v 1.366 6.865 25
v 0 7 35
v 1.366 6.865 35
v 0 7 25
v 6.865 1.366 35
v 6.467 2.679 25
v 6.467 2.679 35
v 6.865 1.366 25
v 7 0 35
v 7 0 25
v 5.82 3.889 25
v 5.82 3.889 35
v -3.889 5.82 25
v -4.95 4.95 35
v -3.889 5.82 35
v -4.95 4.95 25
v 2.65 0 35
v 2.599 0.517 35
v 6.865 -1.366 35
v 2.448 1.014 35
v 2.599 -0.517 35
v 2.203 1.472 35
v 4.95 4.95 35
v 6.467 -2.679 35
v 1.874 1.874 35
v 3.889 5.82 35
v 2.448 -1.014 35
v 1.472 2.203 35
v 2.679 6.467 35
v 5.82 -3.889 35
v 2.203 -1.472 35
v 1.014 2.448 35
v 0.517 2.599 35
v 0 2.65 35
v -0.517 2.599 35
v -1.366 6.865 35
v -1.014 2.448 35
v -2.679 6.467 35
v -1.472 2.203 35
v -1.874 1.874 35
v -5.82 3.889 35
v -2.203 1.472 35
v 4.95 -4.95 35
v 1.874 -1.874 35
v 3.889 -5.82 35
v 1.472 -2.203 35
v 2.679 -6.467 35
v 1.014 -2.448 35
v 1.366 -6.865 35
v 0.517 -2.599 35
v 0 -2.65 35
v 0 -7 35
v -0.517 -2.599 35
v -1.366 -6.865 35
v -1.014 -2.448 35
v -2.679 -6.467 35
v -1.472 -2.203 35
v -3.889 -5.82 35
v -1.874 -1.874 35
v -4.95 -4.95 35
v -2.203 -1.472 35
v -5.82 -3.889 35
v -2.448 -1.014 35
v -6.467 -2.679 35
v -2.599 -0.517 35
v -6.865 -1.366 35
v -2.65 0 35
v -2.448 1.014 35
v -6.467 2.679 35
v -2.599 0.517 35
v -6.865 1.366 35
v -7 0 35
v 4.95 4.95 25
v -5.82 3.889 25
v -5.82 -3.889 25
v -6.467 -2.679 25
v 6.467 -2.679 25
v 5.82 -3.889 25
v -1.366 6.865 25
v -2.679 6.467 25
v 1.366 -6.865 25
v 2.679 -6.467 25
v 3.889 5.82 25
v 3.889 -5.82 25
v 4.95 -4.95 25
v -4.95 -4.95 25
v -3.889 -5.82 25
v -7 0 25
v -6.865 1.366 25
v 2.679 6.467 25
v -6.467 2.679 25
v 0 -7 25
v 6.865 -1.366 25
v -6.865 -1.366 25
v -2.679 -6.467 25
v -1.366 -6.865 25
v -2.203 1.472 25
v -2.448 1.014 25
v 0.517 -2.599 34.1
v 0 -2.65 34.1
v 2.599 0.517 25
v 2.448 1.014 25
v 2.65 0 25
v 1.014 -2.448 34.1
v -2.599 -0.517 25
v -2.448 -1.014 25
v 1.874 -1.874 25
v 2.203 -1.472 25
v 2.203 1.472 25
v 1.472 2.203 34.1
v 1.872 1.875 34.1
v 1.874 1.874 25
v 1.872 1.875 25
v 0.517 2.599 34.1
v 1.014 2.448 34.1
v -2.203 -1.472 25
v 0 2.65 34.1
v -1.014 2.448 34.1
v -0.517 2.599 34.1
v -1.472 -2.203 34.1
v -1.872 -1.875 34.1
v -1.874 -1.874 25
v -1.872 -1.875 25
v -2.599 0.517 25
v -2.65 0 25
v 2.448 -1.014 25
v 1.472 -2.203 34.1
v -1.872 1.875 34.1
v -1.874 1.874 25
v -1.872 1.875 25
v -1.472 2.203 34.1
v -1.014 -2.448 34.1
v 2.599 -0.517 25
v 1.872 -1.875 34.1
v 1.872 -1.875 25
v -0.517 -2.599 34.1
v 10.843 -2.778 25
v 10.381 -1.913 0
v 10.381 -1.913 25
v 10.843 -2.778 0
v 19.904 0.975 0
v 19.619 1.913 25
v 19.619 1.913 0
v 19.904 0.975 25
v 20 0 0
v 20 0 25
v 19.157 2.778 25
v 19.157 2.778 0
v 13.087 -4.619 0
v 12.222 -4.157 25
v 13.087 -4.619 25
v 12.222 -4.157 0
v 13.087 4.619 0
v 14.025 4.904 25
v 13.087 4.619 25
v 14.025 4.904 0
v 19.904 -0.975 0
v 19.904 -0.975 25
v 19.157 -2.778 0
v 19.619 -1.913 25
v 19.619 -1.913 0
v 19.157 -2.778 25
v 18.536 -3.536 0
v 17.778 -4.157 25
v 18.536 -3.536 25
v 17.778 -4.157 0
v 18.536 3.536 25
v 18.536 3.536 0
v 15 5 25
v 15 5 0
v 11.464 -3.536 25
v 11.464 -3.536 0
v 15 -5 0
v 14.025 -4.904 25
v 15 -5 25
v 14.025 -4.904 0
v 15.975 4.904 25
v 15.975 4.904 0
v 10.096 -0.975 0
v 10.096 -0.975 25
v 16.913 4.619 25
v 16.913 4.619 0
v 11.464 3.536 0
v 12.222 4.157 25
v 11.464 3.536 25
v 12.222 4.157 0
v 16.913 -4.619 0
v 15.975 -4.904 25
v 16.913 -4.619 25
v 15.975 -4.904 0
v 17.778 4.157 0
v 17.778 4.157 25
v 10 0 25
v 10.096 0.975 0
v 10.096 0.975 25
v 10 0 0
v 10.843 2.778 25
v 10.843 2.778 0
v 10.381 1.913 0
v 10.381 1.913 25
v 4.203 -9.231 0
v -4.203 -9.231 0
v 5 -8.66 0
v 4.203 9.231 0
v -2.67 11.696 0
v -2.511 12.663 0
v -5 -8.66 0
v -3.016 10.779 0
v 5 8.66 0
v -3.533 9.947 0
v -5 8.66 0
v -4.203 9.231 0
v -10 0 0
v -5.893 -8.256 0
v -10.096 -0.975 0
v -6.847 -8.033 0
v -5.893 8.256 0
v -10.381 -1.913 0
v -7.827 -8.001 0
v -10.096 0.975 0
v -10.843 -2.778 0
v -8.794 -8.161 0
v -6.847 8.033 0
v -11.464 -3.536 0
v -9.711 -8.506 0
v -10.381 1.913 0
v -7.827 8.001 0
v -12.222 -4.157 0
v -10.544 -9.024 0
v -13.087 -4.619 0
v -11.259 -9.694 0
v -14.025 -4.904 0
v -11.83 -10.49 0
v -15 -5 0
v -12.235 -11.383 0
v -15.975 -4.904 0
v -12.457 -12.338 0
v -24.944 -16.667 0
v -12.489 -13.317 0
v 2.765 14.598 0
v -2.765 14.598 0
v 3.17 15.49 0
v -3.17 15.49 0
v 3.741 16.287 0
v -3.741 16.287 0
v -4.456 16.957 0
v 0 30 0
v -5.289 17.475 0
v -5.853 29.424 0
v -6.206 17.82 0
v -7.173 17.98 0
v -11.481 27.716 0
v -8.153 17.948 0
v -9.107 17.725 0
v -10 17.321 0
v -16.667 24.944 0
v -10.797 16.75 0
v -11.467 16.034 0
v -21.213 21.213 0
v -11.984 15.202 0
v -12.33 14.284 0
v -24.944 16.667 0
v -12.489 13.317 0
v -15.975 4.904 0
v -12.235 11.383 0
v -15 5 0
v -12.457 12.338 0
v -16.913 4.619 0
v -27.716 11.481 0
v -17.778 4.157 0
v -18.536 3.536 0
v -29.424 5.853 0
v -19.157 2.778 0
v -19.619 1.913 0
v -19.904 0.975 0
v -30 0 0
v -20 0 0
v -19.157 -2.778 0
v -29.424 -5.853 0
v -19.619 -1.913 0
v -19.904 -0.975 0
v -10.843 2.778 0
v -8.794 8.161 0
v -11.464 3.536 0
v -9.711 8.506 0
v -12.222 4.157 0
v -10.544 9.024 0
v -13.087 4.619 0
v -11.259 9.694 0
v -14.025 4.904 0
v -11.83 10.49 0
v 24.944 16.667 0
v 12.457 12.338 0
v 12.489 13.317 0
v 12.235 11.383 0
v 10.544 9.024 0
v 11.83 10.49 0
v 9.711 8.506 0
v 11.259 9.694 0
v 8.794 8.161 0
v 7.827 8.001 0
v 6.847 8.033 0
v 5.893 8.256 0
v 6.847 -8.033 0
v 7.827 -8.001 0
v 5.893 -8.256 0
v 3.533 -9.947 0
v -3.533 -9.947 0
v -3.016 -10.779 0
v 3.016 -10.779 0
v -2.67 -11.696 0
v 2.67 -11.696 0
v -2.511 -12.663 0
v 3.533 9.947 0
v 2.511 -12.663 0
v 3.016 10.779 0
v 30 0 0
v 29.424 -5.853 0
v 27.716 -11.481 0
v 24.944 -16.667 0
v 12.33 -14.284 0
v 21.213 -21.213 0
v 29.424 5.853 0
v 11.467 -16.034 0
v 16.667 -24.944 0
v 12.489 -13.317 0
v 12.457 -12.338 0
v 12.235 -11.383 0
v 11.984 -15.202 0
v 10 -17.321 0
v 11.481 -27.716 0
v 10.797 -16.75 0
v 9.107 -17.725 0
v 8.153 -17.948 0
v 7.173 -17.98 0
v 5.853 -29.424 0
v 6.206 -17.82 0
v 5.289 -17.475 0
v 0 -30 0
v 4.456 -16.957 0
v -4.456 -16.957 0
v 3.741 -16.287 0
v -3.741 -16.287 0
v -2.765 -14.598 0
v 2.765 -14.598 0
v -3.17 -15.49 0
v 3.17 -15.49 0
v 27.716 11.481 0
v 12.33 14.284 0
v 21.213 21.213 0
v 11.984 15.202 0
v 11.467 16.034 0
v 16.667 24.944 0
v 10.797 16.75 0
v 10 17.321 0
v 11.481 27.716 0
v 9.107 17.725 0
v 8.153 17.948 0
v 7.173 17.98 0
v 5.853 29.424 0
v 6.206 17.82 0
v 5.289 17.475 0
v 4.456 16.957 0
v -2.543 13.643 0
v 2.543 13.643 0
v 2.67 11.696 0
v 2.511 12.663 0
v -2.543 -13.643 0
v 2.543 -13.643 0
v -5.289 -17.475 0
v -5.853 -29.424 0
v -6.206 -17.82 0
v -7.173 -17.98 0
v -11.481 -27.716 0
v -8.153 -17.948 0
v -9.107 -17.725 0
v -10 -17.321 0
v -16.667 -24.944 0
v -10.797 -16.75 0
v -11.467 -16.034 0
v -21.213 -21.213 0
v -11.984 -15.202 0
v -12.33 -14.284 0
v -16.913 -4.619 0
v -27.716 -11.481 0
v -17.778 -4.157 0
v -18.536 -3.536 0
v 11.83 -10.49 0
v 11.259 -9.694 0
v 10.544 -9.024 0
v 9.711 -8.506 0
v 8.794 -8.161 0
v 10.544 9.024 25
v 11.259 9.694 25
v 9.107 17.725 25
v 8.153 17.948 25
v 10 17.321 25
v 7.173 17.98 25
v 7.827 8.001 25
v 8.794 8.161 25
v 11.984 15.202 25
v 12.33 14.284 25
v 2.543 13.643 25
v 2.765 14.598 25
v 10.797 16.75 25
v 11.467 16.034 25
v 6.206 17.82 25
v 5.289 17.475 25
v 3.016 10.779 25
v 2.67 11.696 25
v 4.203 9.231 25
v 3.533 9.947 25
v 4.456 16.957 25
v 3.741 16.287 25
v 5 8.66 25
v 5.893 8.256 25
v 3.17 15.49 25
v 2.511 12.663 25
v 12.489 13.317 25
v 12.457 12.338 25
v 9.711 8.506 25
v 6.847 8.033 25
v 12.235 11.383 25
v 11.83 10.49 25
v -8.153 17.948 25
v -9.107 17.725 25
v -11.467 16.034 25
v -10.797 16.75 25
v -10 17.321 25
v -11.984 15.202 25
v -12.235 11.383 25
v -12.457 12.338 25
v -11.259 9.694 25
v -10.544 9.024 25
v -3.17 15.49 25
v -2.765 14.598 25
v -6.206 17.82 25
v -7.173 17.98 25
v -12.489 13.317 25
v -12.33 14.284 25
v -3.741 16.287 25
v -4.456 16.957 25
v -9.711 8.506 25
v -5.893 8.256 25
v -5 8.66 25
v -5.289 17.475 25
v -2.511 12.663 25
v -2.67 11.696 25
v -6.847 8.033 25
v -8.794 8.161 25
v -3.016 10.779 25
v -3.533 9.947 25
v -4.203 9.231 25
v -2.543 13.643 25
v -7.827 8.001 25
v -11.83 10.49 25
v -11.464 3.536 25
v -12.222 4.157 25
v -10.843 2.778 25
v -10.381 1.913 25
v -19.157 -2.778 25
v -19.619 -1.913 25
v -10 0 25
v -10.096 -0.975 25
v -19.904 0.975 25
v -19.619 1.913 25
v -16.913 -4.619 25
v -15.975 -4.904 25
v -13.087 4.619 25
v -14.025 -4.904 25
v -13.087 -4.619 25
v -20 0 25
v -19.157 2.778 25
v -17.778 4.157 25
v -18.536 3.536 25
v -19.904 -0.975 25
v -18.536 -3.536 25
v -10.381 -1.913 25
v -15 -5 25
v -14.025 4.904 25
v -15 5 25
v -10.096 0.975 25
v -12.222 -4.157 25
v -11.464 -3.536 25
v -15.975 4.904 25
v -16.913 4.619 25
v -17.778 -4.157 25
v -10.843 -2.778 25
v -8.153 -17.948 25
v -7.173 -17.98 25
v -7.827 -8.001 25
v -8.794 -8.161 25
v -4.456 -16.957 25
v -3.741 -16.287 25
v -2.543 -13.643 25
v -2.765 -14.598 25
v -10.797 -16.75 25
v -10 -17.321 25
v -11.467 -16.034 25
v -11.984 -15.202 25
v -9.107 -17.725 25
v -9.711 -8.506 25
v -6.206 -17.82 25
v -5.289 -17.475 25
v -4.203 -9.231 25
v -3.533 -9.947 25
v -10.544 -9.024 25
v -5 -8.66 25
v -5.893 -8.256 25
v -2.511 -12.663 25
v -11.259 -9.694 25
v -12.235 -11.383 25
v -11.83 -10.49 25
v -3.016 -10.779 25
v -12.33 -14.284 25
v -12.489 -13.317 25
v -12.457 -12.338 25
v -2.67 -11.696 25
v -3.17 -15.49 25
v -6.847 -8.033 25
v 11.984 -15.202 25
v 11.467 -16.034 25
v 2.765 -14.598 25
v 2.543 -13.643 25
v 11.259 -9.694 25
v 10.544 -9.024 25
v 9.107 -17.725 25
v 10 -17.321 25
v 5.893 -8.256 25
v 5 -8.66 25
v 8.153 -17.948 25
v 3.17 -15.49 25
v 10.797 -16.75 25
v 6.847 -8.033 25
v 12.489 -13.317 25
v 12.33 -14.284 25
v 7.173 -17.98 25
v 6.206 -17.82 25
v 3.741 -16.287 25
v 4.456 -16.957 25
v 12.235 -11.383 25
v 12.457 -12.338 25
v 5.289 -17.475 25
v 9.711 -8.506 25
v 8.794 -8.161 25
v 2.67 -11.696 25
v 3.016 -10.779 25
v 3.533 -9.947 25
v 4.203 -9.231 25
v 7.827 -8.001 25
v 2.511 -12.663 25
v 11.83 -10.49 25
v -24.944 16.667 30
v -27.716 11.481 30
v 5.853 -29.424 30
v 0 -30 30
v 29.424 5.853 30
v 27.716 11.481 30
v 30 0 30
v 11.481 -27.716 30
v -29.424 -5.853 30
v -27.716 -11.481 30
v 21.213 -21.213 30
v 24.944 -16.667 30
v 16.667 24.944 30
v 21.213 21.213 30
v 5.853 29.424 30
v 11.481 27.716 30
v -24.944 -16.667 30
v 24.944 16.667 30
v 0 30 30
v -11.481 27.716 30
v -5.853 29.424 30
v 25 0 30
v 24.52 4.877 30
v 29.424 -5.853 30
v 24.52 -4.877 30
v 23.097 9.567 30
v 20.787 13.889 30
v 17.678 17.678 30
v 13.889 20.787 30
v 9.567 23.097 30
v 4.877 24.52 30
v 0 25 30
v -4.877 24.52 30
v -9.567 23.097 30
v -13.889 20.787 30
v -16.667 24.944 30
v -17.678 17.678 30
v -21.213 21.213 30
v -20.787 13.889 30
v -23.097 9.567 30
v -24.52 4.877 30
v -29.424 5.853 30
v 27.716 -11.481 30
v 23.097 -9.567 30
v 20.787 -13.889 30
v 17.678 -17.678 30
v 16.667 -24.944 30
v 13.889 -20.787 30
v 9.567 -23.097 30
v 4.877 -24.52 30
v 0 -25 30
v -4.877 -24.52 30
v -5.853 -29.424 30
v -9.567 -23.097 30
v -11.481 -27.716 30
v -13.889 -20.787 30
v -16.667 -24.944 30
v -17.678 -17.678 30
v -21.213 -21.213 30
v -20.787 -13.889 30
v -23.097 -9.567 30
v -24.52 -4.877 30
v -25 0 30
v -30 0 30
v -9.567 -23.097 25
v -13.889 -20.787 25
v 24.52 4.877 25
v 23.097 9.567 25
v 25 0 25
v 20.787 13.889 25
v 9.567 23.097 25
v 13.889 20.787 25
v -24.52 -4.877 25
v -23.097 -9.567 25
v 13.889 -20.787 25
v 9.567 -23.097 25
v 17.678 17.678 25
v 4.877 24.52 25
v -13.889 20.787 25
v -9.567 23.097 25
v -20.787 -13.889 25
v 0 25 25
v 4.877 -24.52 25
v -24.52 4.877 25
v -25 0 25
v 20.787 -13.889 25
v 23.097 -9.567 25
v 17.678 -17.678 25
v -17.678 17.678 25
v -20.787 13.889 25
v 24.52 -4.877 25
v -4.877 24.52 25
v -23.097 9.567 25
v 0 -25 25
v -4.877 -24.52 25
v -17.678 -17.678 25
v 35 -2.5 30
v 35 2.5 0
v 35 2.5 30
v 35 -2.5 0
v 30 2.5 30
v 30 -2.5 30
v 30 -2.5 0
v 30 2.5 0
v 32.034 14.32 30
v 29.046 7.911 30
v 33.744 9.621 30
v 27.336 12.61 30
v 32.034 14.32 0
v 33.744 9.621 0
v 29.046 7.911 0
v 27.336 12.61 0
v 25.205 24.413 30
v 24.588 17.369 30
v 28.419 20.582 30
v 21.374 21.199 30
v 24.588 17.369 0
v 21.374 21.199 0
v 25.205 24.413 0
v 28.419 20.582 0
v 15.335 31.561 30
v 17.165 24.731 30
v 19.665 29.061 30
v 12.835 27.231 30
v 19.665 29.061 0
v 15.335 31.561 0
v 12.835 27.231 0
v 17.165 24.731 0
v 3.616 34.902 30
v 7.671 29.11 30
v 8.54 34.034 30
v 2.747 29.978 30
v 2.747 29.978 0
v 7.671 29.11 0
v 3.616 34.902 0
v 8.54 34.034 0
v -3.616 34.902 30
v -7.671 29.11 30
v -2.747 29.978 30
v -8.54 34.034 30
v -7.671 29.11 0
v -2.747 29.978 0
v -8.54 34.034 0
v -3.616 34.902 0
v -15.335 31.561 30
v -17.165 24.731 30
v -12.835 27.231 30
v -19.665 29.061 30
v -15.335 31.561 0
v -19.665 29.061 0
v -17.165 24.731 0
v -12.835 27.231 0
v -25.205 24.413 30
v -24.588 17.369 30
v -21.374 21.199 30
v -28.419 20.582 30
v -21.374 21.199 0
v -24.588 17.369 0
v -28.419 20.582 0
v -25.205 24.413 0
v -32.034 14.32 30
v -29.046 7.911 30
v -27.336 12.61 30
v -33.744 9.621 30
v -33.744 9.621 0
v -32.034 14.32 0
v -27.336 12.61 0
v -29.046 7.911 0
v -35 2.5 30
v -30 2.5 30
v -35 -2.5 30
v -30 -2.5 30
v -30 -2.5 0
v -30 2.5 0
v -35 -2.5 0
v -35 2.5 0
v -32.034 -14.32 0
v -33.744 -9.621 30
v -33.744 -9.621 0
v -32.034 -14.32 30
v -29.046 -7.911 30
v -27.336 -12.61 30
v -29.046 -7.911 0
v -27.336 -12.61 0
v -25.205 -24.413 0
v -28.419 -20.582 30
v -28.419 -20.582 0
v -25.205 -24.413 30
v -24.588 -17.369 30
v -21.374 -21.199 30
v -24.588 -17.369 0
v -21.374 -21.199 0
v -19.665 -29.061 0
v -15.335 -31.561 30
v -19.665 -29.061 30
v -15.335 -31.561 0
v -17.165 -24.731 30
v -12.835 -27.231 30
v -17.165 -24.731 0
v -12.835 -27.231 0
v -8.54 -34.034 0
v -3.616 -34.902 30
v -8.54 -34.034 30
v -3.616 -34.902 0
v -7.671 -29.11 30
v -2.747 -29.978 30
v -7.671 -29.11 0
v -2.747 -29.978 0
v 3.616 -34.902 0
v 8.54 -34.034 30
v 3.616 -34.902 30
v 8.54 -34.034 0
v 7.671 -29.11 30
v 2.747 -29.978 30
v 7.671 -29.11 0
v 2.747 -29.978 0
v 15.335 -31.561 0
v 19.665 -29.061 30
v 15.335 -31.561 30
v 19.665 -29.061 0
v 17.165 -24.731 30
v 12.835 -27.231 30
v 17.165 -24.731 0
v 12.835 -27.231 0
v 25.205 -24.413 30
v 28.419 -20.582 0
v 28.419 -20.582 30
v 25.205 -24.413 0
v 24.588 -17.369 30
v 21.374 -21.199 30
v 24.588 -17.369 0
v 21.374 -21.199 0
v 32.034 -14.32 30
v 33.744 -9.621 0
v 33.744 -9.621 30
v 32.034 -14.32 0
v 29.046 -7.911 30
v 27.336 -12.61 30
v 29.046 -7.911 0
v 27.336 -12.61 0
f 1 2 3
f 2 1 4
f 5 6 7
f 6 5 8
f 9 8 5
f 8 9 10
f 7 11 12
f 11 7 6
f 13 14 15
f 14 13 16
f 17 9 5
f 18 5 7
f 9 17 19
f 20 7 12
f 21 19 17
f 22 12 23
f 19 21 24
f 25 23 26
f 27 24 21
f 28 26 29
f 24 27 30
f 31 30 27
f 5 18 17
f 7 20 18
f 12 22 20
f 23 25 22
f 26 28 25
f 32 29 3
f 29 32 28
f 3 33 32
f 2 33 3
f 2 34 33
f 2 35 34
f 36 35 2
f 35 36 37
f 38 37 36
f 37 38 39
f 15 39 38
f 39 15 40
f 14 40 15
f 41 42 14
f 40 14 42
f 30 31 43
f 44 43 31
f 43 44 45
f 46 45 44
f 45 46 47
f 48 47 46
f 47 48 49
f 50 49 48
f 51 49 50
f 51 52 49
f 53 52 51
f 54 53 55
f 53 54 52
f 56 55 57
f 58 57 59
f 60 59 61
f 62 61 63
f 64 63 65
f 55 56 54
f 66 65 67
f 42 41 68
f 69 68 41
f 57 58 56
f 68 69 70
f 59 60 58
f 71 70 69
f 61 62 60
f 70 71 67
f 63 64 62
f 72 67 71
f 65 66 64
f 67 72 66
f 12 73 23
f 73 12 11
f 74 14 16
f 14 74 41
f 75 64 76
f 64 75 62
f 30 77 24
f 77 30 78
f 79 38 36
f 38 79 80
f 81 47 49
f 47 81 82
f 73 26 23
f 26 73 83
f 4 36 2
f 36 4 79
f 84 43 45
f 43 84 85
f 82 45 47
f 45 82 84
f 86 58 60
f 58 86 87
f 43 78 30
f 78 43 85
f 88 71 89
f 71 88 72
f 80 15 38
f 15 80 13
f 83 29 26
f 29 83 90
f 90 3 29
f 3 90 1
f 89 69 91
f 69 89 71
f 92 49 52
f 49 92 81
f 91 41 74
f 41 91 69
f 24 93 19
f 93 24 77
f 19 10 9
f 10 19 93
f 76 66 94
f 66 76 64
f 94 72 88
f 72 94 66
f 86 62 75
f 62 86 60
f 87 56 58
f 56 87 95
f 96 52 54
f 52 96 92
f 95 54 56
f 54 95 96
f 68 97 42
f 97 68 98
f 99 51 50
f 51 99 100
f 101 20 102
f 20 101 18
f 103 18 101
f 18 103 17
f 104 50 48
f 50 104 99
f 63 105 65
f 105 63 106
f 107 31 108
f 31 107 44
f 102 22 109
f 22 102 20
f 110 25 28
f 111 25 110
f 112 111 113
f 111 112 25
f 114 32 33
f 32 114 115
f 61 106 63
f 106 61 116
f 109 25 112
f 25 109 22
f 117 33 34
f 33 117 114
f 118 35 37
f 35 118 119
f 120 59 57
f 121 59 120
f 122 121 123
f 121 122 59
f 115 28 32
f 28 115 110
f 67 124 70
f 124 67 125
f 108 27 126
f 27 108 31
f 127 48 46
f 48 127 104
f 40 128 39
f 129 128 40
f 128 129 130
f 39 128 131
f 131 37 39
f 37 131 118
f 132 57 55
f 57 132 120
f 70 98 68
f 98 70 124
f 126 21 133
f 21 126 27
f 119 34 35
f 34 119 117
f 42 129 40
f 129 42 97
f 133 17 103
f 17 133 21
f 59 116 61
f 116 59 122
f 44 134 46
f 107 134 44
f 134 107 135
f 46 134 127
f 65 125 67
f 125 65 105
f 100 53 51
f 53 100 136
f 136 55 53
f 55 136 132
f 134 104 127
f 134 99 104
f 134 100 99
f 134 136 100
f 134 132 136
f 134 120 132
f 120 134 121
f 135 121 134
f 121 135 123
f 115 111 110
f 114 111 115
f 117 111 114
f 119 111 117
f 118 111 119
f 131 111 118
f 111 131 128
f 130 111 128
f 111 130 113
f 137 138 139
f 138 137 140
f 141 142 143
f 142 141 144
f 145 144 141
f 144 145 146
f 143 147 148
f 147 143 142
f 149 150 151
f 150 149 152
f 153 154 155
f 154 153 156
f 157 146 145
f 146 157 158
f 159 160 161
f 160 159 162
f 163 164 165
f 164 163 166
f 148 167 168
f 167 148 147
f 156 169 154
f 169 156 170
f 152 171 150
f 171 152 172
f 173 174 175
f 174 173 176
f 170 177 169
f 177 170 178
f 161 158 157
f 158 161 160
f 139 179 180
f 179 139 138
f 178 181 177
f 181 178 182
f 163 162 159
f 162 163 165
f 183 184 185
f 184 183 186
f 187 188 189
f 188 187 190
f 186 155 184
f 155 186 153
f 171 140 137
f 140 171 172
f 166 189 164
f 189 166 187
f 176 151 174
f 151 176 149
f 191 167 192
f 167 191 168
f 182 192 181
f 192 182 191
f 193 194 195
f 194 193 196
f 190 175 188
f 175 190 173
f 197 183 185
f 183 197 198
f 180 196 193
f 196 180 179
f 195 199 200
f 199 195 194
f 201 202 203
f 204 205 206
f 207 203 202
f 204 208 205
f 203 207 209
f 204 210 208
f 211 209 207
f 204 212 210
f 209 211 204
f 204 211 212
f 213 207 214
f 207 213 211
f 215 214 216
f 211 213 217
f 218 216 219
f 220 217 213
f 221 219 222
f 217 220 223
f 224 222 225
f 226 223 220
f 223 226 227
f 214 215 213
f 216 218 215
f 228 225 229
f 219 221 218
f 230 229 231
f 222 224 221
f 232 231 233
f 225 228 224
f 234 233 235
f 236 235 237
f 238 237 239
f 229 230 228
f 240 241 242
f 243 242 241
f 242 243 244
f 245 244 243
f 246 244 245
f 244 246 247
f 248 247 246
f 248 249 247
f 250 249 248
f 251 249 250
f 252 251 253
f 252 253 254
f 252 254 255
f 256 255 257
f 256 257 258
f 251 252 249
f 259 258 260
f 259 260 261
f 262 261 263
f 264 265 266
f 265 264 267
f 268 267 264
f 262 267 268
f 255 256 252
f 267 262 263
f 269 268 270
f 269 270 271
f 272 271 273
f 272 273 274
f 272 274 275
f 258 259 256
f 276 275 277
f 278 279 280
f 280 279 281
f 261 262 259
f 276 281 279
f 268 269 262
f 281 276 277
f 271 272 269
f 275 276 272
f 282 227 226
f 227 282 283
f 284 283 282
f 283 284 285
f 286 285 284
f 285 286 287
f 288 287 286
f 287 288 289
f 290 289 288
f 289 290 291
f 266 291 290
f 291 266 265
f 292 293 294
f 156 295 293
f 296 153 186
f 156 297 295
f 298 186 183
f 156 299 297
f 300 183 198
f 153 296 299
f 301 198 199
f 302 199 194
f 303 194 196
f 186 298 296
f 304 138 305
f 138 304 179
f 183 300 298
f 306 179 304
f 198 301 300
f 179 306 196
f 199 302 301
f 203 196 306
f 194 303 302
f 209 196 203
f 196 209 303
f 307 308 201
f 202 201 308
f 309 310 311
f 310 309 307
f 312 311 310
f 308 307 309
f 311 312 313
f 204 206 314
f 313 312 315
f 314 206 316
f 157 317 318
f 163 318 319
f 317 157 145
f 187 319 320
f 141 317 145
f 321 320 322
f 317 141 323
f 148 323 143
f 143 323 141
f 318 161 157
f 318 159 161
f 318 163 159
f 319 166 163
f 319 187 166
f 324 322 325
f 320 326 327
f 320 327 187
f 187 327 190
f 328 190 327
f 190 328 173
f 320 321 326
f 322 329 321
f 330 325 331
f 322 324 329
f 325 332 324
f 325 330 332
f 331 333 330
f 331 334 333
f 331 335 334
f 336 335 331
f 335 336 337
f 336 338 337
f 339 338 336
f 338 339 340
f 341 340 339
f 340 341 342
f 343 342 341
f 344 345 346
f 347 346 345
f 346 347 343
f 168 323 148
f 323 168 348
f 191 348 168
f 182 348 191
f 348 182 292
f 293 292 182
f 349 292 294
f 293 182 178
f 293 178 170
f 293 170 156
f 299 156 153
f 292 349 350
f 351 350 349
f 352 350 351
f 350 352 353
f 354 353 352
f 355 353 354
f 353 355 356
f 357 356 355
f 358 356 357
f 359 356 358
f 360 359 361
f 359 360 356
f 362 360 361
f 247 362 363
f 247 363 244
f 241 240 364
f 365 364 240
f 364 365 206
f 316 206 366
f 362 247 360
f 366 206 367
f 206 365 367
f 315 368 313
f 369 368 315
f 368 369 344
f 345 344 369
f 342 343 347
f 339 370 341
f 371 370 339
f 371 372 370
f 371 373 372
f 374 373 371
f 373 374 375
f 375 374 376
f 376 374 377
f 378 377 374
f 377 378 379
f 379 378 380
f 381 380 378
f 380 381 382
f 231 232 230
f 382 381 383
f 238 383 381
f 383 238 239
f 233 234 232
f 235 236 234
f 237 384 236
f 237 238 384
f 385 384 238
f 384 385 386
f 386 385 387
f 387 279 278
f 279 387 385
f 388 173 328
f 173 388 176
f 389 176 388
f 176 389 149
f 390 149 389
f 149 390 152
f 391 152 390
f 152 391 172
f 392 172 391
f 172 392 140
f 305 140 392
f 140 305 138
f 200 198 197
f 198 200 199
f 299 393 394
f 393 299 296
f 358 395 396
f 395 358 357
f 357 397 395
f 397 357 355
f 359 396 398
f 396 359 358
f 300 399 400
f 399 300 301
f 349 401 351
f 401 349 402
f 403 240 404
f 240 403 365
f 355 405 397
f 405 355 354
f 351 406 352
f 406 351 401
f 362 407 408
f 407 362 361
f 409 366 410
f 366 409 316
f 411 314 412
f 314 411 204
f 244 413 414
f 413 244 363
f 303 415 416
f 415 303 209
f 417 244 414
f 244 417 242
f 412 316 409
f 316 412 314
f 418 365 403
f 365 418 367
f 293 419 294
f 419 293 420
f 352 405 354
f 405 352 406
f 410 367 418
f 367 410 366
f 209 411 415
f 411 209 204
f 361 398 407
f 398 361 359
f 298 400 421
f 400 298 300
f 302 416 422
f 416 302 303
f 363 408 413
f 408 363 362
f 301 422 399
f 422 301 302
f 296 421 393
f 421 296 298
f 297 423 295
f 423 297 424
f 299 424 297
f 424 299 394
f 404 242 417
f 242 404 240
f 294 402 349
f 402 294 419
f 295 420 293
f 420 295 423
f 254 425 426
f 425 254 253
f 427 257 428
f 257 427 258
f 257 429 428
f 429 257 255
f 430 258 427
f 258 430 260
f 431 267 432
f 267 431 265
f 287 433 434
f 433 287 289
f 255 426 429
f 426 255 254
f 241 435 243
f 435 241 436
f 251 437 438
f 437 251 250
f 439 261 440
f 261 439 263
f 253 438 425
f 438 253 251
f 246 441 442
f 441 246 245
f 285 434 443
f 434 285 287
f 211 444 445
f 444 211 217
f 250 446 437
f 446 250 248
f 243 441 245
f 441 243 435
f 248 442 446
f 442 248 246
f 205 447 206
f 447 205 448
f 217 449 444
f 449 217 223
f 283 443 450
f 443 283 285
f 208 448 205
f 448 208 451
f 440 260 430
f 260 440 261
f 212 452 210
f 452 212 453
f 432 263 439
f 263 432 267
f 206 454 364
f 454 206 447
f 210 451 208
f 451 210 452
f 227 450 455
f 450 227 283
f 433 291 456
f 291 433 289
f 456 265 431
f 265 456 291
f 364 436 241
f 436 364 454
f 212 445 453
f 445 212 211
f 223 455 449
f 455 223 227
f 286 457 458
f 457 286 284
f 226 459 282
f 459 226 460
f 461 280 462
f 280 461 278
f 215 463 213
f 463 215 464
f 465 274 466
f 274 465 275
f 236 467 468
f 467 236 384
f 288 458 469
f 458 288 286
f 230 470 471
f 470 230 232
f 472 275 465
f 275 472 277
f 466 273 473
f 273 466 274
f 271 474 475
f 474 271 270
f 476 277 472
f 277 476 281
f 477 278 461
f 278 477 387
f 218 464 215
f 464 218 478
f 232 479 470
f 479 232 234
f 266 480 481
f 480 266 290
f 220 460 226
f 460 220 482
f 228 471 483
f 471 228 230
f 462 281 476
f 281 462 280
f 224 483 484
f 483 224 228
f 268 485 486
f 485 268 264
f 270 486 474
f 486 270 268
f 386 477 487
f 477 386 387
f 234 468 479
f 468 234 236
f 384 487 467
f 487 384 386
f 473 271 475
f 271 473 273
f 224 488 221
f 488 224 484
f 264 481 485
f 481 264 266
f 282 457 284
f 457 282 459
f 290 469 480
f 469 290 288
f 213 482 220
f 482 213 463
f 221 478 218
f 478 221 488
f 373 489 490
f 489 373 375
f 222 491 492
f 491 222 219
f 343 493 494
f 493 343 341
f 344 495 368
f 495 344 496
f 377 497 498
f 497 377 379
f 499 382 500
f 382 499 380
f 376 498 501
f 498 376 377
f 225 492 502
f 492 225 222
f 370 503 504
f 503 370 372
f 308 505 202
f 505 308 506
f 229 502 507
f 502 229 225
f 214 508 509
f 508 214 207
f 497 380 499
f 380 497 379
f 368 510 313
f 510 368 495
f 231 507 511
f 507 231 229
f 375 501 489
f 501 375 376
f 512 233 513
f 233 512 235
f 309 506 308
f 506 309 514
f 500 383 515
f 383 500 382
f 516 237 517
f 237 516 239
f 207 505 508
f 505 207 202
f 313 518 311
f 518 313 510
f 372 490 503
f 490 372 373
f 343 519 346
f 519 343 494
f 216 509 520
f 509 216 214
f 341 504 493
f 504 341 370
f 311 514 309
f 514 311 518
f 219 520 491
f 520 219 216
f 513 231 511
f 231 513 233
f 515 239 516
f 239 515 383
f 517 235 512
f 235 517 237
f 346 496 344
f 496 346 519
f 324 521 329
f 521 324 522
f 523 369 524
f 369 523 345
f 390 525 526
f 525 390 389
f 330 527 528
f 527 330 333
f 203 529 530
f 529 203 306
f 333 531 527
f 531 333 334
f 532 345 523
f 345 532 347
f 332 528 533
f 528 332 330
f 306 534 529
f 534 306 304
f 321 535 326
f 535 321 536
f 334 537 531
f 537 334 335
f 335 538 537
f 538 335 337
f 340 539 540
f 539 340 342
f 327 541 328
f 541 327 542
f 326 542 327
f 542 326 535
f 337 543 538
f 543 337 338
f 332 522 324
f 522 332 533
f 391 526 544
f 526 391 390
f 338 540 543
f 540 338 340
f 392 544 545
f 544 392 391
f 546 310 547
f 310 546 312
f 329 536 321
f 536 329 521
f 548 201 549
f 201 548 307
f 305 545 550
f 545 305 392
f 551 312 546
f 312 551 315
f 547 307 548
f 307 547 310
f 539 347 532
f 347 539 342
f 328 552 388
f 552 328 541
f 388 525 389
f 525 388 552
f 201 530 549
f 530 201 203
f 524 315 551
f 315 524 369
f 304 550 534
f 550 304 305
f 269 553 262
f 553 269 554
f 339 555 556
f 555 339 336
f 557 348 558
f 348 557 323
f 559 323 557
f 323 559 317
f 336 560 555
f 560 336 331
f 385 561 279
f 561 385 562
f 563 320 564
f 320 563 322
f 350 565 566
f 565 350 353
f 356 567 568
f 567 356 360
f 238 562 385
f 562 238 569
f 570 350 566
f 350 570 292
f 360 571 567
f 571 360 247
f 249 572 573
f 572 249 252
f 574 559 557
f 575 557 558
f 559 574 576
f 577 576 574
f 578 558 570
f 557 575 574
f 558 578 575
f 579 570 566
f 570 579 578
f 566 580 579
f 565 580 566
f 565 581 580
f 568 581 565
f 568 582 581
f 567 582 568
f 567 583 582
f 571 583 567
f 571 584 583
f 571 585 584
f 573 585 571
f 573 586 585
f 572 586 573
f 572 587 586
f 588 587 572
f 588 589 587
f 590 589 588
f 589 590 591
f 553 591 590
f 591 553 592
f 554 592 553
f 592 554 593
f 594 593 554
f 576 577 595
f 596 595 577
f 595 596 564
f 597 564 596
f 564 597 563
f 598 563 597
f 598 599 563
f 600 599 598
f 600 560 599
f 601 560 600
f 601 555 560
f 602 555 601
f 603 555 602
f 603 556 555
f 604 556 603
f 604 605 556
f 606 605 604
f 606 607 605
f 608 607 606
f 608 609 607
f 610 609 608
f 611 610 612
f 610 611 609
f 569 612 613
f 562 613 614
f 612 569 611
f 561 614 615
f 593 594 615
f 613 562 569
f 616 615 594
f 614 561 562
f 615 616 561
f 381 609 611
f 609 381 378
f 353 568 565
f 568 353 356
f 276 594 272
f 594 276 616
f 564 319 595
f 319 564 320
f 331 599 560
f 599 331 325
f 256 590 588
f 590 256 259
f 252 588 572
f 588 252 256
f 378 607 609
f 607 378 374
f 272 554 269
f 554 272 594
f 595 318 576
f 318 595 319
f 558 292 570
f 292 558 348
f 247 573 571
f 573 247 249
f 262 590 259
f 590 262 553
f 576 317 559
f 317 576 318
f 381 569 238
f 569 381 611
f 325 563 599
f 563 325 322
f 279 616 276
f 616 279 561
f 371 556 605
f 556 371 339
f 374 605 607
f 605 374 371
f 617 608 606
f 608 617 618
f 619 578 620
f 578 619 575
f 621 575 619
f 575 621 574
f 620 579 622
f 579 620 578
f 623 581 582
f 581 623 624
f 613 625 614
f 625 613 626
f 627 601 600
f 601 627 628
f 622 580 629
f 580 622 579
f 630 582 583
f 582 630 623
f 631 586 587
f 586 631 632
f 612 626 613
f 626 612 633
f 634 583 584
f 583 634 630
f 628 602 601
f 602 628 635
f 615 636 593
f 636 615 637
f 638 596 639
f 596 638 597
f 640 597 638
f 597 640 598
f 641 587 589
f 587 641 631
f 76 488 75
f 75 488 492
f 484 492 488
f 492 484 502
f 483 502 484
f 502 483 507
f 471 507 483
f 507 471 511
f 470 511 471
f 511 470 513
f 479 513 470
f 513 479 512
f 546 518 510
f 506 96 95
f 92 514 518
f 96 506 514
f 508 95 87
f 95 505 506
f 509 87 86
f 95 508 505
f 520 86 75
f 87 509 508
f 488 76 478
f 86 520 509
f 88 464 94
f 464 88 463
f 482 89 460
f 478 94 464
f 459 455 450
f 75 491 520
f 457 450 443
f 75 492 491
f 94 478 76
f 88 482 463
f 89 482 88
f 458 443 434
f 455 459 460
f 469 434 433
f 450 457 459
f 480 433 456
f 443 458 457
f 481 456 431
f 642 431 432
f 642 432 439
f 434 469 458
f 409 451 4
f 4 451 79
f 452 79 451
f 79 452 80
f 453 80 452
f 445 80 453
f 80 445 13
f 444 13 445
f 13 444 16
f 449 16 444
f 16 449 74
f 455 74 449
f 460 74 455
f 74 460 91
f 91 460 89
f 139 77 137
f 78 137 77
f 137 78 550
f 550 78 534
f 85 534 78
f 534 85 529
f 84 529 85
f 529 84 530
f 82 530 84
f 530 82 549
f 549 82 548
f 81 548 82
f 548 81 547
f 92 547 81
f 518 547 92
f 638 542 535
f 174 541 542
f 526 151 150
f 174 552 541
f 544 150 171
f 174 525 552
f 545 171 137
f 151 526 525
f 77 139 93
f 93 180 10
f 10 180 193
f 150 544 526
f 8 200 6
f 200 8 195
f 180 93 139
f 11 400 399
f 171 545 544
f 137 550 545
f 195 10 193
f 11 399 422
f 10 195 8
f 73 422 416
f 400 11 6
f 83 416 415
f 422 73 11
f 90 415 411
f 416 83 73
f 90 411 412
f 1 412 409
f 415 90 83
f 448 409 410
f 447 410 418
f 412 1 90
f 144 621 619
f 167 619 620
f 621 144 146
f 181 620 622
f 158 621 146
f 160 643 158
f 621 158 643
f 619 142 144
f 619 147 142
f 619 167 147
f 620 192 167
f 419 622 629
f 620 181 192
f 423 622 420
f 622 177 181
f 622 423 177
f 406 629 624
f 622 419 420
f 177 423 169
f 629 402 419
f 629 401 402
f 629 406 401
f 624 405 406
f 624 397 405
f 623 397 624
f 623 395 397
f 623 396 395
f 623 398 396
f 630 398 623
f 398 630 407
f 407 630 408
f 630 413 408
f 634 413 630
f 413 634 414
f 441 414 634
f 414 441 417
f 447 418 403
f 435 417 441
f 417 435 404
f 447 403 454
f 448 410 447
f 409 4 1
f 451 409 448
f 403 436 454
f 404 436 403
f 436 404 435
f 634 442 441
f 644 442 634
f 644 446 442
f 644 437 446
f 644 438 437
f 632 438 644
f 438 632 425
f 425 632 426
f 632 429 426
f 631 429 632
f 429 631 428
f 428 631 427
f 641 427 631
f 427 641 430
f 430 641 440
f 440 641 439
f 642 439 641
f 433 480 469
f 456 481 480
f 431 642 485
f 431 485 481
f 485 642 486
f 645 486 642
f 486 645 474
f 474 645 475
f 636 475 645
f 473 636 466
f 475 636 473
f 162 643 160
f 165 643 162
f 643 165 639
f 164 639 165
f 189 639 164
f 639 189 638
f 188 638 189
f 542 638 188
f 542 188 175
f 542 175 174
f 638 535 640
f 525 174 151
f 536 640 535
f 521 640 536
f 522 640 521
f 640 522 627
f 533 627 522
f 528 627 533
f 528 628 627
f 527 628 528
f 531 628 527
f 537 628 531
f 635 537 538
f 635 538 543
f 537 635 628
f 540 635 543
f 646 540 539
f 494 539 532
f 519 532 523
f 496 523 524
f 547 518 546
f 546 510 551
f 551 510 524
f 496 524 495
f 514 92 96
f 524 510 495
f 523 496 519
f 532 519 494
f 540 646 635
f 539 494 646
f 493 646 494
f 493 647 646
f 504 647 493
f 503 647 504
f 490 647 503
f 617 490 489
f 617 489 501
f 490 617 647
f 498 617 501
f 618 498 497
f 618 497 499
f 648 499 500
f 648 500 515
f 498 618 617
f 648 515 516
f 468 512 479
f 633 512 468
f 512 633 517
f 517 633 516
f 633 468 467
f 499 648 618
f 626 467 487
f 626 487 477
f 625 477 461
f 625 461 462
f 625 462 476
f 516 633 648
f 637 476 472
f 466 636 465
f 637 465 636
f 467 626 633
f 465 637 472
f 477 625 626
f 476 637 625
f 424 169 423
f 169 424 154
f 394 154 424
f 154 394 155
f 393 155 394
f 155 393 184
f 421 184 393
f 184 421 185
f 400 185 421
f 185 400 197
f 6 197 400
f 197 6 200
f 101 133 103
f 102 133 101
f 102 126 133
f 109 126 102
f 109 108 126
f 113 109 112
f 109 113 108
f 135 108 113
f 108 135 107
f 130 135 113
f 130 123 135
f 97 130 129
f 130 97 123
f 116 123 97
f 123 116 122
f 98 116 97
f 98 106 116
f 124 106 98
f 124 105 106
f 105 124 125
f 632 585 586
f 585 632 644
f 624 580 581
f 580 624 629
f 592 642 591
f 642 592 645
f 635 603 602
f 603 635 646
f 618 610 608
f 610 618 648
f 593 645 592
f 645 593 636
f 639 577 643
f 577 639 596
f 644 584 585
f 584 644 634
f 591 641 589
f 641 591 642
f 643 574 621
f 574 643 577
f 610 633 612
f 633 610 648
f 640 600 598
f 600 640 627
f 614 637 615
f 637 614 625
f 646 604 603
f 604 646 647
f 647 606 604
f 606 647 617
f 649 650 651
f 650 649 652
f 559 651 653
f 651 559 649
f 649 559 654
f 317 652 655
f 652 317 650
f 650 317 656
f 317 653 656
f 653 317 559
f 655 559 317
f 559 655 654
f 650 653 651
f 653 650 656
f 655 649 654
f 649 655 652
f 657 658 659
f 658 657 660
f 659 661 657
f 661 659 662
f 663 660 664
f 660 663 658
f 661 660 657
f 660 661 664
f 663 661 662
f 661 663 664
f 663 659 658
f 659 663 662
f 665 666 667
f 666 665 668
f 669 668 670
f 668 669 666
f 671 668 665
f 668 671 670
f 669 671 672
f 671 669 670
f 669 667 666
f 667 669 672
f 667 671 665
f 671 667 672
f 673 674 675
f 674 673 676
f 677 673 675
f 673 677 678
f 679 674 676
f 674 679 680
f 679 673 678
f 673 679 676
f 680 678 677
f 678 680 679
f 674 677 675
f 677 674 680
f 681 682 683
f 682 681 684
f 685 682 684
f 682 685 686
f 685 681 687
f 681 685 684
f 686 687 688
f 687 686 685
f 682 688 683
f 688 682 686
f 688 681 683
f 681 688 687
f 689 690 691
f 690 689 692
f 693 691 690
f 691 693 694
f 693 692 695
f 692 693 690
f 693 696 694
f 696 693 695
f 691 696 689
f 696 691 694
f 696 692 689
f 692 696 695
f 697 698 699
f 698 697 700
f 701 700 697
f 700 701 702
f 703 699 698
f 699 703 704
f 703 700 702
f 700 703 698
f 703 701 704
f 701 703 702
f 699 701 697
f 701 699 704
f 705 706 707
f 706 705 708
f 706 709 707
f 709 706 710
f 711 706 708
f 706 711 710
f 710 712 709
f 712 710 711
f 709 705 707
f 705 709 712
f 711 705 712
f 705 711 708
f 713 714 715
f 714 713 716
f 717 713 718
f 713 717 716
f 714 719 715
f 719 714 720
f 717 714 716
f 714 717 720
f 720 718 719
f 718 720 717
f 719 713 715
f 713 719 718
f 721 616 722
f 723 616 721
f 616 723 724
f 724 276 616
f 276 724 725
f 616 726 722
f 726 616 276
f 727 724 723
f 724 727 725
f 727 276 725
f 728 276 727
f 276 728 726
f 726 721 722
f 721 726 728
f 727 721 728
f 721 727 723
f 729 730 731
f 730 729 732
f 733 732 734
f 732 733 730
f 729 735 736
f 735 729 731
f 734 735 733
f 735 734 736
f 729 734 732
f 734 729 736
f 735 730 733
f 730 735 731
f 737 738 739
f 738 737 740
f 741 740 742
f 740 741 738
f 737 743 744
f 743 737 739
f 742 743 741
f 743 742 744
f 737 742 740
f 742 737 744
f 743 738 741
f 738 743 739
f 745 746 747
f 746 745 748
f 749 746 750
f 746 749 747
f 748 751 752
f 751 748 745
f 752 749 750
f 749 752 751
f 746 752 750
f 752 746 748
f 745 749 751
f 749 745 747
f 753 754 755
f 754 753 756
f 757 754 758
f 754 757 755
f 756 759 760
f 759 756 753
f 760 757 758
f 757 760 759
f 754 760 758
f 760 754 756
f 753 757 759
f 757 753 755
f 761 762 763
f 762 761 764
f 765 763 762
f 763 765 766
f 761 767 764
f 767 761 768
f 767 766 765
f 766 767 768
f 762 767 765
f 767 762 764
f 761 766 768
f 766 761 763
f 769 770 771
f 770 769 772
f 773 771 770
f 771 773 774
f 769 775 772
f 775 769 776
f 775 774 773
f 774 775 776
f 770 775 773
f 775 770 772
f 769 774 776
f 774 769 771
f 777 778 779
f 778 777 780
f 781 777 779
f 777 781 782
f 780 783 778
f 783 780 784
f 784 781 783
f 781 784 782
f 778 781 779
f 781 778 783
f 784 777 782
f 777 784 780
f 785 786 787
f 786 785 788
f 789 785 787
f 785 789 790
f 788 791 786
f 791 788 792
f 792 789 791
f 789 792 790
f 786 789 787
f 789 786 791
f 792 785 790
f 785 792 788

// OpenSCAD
$fn=32;

//wheel by moondeck
//MIT license

union() {
	translate([0,0,5])
	union() {
		translate([0,-2.325,17.6])
		cube([5,0.9,23],center=true);
		translate([0,2.325,17.6])
		cube([5,0.9,23],center=true);

		difference() {
			cylinder(h=30,d=14);
			translate([0,0,6])
			cylinder(h=24,d=5.3);
		}

	}
	difference() {
		cylinder(h=30,d=60);
		translate([0,0,25])
		cylinder(h=5,d=50);

		for (i=[0,60,120,180,240,300,360]) 
		rotate(i)	
		translate([15,0,0])
		cylinder(h=30,d=10);
	}


	for (i=[0,20,40,60,80,100,120,140,160,180,200,220,240,260,280,300,320,340,360]) 
		rotate(i)	
		translate([30,-2.5,0])
		cube([5,5,30]);
}
